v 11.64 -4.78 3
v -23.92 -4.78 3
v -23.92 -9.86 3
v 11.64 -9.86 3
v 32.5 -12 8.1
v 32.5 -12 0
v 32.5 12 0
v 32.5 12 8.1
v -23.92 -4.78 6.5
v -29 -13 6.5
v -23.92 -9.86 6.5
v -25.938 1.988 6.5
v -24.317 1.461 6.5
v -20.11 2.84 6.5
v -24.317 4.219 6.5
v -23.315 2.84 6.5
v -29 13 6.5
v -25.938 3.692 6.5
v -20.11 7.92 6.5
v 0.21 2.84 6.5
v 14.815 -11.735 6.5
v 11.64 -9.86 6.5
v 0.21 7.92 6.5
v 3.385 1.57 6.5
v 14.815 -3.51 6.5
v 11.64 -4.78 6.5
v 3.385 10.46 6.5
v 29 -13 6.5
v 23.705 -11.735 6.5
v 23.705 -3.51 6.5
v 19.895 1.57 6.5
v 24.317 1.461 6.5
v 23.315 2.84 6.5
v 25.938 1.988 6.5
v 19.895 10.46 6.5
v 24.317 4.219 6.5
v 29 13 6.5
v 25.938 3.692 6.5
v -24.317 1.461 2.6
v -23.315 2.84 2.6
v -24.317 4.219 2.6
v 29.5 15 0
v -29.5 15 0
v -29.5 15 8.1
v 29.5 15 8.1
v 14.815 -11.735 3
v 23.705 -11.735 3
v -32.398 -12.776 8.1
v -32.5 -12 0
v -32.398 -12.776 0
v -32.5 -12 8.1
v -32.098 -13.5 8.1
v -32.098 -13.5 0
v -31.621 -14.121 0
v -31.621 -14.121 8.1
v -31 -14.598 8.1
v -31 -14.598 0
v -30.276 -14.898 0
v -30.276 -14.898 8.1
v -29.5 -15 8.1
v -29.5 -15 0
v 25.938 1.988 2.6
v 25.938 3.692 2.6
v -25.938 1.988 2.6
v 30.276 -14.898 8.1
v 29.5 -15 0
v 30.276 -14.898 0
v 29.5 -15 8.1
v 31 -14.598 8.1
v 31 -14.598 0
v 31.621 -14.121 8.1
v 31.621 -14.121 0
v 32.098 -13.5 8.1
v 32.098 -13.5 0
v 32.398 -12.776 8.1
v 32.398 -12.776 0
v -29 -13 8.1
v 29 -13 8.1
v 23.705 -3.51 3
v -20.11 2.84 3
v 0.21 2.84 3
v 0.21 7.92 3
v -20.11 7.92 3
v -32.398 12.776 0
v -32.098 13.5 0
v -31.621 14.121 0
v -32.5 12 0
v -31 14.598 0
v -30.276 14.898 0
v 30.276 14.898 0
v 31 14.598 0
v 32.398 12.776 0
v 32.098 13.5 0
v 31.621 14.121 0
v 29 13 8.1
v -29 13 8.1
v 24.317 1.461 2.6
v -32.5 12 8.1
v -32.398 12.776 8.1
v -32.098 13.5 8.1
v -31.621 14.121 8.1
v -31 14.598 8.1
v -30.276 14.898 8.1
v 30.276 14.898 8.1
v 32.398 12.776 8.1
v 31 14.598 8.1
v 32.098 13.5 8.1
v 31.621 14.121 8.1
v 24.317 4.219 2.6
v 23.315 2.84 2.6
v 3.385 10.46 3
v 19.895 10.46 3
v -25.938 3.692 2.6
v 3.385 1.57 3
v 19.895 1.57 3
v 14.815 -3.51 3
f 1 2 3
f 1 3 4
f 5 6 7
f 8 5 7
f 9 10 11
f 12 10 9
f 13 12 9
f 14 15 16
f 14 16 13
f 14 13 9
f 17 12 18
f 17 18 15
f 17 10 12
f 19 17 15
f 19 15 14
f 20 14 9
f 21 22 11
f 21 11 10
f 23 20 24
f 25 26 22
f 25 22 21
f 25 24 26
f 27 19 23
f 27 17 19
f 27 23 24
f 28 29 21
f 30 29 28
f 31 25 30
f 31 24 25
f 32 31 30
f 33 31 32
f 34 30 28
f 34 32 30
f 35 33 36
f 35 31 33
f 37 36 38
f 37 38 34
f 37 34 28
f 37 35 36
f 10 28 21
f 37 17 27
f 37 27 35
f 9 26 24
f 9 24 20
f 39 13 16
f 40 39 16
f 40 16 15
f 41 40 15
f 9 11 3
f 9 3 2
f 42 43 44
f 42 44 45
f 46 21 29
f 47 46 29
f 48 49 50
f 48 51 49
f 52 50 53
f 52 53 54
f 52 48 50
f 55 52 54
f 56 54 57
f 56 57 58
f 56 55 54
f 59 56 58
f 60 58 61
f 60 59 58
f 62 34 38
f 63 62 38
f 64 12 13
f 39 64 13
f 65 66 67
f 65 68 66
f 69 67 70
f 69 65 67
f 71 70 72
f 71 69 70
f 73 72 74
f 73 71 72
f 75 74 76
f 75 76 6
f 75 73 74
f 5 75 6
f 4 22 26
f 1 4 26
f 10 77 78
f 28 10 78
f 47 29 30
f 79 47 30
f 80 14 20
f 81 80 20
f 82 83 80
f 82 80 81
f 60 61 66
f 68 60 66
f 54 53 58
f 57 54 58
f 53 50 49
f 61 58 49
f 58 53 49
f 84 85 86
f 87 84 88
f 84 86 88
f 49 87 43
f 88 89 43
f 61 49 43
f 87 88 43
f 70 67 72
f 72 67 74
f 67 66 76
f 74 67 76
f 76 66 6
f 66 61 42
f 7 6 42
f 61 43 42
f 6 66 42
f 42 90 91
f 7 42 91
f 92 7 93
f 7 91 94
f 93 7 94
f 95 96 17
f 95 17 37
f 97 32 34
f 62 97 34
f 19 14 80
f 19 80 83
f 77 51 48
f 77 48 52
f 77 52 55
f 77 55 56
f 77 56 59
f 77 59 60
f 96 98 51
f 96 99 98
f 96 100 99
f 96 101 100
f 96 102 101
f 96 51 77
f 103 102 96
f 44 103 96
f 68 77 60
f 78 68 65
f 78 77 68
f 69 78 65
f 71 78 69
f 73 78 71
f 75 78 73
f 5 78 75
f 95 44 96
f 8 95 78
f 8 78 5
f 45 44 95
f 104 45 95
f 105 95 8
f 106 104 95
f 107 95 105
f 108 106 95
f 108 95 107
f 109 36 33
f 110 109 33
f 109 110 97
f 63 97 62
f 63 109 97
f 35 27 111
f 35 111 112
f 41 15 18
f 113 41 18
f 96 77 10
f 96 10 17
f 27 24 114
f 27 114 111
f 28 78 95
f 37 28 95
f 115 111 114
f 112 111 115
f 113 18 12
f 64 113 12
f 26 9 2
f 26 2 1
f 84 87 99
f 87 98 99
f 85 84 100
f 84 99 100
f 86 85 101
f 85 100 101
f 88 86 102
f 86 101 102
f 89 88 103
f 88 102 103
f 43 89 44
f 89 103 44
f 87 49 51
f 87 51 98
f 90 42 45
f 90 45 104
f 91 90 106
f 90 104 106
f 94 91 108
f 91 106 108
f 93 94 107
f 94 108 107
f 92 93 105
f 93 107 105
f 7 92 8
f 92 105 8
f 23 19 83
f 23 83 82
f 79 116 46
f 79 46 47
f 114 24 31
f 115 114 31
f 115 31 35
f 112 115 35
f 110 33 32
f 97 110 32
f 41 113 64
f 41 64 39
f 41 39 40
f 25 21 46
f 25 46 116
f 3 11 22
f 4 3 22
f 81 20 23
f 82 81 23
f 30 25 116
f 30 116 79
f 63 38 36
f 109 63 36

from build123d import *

# Parameters (mm, degrees)
SKETCH_W        = 65
SKETCH_H        = 30
PAD_DEPTH       = 8.1
SKETCH001_W     = 58
SKETCH001_H     = 26
POCKET_DEPTH    = 1.6
POCKET001_DEPTH = 5.5
SKETCH003_W     = 20.32
SKETCH003_H     = 5.08
SKETCH003_W_2   = 16.51
SKETCH003_H_2   = 8.89
SKETCH003_W_3   = 8.89
SKETCH003_H_3   = 8.225
SKETCH003_W_4   = 35.56
POCKET002_DEPTH = 3.5
FILLET_R        = 3


with BuildPart() as part:
    # Sketch → Pad (new body)
    with BuildSketch(Plane.XY):
        Rectangle(SKETCH_W, SKETCH_H)
    extrude(amount=PAD_DEPTH)

    # Sketch001 (on DatumPlane) → Pocket (cut)
    with BuildSketch(Plane.XY.offset(8.1)):
        Rectangle(SKETCH001_W, SKETCH001_H)
    extrude(amount=-POCKET_DEPTH, mode=Mode.SUBTRACT)

    # Sketch002 (on DatumPlane) → Pocket001 (cut)
    with BuildSketch(Plane.XY.offset(8.1)):
        Polygon((-23.315, 2.84), (-24.316925, 4.219032), (-25.938075, 3.692289), (-25.938075, 1.987711), (-24.316925, 1.460968), align=None)
        Polygon((23.315, 2.84), (24.316925, 1.460968), (25.938075, 1.987711), (25.938075, 3.692289), (24.316925, 4.219032), align=None)
    extrude(amount=-POCKET001_DEPTH, mode=Mode.SUBTRACT)

    # Sketch003 (on DatumPlane) → Pocket002 (cut)
    with BuildSketch(Plane.XY.offset(6.5)):
        with Locations((-9.95, 5.38)):
            Rectangle(SKETCH003_W, SKETCH003_H)
        with Locations((11.64, 6.015)):
            Rectangle(SKETCH003_W_2, SKETCH003_H_2)
        with Locations((19.26, -7.6225)):
            Rectangle(SKETCH003_W_3, SKETCH003_H_3)
        with Locations((-6.14, -7.32)):
            Rectangle(SKETCH003_W_4, SKETCH003_H)
    extrude(amount=-POCKET002_DEPTH, mode=Mode.SUBTRACT)

    # Fillet
    fillet_edges = [part.edges().sort_by_distance(p)[0] for p in [
        (-32.5, -15, 4.05),
        (32.5, -15, 4.05),
        (32.5, 15, 4.05),
        (-32.5, 15, 4.05),
    ]]
    fillet(fillet_edges, radius=FILLET_R)


solid = part.part
